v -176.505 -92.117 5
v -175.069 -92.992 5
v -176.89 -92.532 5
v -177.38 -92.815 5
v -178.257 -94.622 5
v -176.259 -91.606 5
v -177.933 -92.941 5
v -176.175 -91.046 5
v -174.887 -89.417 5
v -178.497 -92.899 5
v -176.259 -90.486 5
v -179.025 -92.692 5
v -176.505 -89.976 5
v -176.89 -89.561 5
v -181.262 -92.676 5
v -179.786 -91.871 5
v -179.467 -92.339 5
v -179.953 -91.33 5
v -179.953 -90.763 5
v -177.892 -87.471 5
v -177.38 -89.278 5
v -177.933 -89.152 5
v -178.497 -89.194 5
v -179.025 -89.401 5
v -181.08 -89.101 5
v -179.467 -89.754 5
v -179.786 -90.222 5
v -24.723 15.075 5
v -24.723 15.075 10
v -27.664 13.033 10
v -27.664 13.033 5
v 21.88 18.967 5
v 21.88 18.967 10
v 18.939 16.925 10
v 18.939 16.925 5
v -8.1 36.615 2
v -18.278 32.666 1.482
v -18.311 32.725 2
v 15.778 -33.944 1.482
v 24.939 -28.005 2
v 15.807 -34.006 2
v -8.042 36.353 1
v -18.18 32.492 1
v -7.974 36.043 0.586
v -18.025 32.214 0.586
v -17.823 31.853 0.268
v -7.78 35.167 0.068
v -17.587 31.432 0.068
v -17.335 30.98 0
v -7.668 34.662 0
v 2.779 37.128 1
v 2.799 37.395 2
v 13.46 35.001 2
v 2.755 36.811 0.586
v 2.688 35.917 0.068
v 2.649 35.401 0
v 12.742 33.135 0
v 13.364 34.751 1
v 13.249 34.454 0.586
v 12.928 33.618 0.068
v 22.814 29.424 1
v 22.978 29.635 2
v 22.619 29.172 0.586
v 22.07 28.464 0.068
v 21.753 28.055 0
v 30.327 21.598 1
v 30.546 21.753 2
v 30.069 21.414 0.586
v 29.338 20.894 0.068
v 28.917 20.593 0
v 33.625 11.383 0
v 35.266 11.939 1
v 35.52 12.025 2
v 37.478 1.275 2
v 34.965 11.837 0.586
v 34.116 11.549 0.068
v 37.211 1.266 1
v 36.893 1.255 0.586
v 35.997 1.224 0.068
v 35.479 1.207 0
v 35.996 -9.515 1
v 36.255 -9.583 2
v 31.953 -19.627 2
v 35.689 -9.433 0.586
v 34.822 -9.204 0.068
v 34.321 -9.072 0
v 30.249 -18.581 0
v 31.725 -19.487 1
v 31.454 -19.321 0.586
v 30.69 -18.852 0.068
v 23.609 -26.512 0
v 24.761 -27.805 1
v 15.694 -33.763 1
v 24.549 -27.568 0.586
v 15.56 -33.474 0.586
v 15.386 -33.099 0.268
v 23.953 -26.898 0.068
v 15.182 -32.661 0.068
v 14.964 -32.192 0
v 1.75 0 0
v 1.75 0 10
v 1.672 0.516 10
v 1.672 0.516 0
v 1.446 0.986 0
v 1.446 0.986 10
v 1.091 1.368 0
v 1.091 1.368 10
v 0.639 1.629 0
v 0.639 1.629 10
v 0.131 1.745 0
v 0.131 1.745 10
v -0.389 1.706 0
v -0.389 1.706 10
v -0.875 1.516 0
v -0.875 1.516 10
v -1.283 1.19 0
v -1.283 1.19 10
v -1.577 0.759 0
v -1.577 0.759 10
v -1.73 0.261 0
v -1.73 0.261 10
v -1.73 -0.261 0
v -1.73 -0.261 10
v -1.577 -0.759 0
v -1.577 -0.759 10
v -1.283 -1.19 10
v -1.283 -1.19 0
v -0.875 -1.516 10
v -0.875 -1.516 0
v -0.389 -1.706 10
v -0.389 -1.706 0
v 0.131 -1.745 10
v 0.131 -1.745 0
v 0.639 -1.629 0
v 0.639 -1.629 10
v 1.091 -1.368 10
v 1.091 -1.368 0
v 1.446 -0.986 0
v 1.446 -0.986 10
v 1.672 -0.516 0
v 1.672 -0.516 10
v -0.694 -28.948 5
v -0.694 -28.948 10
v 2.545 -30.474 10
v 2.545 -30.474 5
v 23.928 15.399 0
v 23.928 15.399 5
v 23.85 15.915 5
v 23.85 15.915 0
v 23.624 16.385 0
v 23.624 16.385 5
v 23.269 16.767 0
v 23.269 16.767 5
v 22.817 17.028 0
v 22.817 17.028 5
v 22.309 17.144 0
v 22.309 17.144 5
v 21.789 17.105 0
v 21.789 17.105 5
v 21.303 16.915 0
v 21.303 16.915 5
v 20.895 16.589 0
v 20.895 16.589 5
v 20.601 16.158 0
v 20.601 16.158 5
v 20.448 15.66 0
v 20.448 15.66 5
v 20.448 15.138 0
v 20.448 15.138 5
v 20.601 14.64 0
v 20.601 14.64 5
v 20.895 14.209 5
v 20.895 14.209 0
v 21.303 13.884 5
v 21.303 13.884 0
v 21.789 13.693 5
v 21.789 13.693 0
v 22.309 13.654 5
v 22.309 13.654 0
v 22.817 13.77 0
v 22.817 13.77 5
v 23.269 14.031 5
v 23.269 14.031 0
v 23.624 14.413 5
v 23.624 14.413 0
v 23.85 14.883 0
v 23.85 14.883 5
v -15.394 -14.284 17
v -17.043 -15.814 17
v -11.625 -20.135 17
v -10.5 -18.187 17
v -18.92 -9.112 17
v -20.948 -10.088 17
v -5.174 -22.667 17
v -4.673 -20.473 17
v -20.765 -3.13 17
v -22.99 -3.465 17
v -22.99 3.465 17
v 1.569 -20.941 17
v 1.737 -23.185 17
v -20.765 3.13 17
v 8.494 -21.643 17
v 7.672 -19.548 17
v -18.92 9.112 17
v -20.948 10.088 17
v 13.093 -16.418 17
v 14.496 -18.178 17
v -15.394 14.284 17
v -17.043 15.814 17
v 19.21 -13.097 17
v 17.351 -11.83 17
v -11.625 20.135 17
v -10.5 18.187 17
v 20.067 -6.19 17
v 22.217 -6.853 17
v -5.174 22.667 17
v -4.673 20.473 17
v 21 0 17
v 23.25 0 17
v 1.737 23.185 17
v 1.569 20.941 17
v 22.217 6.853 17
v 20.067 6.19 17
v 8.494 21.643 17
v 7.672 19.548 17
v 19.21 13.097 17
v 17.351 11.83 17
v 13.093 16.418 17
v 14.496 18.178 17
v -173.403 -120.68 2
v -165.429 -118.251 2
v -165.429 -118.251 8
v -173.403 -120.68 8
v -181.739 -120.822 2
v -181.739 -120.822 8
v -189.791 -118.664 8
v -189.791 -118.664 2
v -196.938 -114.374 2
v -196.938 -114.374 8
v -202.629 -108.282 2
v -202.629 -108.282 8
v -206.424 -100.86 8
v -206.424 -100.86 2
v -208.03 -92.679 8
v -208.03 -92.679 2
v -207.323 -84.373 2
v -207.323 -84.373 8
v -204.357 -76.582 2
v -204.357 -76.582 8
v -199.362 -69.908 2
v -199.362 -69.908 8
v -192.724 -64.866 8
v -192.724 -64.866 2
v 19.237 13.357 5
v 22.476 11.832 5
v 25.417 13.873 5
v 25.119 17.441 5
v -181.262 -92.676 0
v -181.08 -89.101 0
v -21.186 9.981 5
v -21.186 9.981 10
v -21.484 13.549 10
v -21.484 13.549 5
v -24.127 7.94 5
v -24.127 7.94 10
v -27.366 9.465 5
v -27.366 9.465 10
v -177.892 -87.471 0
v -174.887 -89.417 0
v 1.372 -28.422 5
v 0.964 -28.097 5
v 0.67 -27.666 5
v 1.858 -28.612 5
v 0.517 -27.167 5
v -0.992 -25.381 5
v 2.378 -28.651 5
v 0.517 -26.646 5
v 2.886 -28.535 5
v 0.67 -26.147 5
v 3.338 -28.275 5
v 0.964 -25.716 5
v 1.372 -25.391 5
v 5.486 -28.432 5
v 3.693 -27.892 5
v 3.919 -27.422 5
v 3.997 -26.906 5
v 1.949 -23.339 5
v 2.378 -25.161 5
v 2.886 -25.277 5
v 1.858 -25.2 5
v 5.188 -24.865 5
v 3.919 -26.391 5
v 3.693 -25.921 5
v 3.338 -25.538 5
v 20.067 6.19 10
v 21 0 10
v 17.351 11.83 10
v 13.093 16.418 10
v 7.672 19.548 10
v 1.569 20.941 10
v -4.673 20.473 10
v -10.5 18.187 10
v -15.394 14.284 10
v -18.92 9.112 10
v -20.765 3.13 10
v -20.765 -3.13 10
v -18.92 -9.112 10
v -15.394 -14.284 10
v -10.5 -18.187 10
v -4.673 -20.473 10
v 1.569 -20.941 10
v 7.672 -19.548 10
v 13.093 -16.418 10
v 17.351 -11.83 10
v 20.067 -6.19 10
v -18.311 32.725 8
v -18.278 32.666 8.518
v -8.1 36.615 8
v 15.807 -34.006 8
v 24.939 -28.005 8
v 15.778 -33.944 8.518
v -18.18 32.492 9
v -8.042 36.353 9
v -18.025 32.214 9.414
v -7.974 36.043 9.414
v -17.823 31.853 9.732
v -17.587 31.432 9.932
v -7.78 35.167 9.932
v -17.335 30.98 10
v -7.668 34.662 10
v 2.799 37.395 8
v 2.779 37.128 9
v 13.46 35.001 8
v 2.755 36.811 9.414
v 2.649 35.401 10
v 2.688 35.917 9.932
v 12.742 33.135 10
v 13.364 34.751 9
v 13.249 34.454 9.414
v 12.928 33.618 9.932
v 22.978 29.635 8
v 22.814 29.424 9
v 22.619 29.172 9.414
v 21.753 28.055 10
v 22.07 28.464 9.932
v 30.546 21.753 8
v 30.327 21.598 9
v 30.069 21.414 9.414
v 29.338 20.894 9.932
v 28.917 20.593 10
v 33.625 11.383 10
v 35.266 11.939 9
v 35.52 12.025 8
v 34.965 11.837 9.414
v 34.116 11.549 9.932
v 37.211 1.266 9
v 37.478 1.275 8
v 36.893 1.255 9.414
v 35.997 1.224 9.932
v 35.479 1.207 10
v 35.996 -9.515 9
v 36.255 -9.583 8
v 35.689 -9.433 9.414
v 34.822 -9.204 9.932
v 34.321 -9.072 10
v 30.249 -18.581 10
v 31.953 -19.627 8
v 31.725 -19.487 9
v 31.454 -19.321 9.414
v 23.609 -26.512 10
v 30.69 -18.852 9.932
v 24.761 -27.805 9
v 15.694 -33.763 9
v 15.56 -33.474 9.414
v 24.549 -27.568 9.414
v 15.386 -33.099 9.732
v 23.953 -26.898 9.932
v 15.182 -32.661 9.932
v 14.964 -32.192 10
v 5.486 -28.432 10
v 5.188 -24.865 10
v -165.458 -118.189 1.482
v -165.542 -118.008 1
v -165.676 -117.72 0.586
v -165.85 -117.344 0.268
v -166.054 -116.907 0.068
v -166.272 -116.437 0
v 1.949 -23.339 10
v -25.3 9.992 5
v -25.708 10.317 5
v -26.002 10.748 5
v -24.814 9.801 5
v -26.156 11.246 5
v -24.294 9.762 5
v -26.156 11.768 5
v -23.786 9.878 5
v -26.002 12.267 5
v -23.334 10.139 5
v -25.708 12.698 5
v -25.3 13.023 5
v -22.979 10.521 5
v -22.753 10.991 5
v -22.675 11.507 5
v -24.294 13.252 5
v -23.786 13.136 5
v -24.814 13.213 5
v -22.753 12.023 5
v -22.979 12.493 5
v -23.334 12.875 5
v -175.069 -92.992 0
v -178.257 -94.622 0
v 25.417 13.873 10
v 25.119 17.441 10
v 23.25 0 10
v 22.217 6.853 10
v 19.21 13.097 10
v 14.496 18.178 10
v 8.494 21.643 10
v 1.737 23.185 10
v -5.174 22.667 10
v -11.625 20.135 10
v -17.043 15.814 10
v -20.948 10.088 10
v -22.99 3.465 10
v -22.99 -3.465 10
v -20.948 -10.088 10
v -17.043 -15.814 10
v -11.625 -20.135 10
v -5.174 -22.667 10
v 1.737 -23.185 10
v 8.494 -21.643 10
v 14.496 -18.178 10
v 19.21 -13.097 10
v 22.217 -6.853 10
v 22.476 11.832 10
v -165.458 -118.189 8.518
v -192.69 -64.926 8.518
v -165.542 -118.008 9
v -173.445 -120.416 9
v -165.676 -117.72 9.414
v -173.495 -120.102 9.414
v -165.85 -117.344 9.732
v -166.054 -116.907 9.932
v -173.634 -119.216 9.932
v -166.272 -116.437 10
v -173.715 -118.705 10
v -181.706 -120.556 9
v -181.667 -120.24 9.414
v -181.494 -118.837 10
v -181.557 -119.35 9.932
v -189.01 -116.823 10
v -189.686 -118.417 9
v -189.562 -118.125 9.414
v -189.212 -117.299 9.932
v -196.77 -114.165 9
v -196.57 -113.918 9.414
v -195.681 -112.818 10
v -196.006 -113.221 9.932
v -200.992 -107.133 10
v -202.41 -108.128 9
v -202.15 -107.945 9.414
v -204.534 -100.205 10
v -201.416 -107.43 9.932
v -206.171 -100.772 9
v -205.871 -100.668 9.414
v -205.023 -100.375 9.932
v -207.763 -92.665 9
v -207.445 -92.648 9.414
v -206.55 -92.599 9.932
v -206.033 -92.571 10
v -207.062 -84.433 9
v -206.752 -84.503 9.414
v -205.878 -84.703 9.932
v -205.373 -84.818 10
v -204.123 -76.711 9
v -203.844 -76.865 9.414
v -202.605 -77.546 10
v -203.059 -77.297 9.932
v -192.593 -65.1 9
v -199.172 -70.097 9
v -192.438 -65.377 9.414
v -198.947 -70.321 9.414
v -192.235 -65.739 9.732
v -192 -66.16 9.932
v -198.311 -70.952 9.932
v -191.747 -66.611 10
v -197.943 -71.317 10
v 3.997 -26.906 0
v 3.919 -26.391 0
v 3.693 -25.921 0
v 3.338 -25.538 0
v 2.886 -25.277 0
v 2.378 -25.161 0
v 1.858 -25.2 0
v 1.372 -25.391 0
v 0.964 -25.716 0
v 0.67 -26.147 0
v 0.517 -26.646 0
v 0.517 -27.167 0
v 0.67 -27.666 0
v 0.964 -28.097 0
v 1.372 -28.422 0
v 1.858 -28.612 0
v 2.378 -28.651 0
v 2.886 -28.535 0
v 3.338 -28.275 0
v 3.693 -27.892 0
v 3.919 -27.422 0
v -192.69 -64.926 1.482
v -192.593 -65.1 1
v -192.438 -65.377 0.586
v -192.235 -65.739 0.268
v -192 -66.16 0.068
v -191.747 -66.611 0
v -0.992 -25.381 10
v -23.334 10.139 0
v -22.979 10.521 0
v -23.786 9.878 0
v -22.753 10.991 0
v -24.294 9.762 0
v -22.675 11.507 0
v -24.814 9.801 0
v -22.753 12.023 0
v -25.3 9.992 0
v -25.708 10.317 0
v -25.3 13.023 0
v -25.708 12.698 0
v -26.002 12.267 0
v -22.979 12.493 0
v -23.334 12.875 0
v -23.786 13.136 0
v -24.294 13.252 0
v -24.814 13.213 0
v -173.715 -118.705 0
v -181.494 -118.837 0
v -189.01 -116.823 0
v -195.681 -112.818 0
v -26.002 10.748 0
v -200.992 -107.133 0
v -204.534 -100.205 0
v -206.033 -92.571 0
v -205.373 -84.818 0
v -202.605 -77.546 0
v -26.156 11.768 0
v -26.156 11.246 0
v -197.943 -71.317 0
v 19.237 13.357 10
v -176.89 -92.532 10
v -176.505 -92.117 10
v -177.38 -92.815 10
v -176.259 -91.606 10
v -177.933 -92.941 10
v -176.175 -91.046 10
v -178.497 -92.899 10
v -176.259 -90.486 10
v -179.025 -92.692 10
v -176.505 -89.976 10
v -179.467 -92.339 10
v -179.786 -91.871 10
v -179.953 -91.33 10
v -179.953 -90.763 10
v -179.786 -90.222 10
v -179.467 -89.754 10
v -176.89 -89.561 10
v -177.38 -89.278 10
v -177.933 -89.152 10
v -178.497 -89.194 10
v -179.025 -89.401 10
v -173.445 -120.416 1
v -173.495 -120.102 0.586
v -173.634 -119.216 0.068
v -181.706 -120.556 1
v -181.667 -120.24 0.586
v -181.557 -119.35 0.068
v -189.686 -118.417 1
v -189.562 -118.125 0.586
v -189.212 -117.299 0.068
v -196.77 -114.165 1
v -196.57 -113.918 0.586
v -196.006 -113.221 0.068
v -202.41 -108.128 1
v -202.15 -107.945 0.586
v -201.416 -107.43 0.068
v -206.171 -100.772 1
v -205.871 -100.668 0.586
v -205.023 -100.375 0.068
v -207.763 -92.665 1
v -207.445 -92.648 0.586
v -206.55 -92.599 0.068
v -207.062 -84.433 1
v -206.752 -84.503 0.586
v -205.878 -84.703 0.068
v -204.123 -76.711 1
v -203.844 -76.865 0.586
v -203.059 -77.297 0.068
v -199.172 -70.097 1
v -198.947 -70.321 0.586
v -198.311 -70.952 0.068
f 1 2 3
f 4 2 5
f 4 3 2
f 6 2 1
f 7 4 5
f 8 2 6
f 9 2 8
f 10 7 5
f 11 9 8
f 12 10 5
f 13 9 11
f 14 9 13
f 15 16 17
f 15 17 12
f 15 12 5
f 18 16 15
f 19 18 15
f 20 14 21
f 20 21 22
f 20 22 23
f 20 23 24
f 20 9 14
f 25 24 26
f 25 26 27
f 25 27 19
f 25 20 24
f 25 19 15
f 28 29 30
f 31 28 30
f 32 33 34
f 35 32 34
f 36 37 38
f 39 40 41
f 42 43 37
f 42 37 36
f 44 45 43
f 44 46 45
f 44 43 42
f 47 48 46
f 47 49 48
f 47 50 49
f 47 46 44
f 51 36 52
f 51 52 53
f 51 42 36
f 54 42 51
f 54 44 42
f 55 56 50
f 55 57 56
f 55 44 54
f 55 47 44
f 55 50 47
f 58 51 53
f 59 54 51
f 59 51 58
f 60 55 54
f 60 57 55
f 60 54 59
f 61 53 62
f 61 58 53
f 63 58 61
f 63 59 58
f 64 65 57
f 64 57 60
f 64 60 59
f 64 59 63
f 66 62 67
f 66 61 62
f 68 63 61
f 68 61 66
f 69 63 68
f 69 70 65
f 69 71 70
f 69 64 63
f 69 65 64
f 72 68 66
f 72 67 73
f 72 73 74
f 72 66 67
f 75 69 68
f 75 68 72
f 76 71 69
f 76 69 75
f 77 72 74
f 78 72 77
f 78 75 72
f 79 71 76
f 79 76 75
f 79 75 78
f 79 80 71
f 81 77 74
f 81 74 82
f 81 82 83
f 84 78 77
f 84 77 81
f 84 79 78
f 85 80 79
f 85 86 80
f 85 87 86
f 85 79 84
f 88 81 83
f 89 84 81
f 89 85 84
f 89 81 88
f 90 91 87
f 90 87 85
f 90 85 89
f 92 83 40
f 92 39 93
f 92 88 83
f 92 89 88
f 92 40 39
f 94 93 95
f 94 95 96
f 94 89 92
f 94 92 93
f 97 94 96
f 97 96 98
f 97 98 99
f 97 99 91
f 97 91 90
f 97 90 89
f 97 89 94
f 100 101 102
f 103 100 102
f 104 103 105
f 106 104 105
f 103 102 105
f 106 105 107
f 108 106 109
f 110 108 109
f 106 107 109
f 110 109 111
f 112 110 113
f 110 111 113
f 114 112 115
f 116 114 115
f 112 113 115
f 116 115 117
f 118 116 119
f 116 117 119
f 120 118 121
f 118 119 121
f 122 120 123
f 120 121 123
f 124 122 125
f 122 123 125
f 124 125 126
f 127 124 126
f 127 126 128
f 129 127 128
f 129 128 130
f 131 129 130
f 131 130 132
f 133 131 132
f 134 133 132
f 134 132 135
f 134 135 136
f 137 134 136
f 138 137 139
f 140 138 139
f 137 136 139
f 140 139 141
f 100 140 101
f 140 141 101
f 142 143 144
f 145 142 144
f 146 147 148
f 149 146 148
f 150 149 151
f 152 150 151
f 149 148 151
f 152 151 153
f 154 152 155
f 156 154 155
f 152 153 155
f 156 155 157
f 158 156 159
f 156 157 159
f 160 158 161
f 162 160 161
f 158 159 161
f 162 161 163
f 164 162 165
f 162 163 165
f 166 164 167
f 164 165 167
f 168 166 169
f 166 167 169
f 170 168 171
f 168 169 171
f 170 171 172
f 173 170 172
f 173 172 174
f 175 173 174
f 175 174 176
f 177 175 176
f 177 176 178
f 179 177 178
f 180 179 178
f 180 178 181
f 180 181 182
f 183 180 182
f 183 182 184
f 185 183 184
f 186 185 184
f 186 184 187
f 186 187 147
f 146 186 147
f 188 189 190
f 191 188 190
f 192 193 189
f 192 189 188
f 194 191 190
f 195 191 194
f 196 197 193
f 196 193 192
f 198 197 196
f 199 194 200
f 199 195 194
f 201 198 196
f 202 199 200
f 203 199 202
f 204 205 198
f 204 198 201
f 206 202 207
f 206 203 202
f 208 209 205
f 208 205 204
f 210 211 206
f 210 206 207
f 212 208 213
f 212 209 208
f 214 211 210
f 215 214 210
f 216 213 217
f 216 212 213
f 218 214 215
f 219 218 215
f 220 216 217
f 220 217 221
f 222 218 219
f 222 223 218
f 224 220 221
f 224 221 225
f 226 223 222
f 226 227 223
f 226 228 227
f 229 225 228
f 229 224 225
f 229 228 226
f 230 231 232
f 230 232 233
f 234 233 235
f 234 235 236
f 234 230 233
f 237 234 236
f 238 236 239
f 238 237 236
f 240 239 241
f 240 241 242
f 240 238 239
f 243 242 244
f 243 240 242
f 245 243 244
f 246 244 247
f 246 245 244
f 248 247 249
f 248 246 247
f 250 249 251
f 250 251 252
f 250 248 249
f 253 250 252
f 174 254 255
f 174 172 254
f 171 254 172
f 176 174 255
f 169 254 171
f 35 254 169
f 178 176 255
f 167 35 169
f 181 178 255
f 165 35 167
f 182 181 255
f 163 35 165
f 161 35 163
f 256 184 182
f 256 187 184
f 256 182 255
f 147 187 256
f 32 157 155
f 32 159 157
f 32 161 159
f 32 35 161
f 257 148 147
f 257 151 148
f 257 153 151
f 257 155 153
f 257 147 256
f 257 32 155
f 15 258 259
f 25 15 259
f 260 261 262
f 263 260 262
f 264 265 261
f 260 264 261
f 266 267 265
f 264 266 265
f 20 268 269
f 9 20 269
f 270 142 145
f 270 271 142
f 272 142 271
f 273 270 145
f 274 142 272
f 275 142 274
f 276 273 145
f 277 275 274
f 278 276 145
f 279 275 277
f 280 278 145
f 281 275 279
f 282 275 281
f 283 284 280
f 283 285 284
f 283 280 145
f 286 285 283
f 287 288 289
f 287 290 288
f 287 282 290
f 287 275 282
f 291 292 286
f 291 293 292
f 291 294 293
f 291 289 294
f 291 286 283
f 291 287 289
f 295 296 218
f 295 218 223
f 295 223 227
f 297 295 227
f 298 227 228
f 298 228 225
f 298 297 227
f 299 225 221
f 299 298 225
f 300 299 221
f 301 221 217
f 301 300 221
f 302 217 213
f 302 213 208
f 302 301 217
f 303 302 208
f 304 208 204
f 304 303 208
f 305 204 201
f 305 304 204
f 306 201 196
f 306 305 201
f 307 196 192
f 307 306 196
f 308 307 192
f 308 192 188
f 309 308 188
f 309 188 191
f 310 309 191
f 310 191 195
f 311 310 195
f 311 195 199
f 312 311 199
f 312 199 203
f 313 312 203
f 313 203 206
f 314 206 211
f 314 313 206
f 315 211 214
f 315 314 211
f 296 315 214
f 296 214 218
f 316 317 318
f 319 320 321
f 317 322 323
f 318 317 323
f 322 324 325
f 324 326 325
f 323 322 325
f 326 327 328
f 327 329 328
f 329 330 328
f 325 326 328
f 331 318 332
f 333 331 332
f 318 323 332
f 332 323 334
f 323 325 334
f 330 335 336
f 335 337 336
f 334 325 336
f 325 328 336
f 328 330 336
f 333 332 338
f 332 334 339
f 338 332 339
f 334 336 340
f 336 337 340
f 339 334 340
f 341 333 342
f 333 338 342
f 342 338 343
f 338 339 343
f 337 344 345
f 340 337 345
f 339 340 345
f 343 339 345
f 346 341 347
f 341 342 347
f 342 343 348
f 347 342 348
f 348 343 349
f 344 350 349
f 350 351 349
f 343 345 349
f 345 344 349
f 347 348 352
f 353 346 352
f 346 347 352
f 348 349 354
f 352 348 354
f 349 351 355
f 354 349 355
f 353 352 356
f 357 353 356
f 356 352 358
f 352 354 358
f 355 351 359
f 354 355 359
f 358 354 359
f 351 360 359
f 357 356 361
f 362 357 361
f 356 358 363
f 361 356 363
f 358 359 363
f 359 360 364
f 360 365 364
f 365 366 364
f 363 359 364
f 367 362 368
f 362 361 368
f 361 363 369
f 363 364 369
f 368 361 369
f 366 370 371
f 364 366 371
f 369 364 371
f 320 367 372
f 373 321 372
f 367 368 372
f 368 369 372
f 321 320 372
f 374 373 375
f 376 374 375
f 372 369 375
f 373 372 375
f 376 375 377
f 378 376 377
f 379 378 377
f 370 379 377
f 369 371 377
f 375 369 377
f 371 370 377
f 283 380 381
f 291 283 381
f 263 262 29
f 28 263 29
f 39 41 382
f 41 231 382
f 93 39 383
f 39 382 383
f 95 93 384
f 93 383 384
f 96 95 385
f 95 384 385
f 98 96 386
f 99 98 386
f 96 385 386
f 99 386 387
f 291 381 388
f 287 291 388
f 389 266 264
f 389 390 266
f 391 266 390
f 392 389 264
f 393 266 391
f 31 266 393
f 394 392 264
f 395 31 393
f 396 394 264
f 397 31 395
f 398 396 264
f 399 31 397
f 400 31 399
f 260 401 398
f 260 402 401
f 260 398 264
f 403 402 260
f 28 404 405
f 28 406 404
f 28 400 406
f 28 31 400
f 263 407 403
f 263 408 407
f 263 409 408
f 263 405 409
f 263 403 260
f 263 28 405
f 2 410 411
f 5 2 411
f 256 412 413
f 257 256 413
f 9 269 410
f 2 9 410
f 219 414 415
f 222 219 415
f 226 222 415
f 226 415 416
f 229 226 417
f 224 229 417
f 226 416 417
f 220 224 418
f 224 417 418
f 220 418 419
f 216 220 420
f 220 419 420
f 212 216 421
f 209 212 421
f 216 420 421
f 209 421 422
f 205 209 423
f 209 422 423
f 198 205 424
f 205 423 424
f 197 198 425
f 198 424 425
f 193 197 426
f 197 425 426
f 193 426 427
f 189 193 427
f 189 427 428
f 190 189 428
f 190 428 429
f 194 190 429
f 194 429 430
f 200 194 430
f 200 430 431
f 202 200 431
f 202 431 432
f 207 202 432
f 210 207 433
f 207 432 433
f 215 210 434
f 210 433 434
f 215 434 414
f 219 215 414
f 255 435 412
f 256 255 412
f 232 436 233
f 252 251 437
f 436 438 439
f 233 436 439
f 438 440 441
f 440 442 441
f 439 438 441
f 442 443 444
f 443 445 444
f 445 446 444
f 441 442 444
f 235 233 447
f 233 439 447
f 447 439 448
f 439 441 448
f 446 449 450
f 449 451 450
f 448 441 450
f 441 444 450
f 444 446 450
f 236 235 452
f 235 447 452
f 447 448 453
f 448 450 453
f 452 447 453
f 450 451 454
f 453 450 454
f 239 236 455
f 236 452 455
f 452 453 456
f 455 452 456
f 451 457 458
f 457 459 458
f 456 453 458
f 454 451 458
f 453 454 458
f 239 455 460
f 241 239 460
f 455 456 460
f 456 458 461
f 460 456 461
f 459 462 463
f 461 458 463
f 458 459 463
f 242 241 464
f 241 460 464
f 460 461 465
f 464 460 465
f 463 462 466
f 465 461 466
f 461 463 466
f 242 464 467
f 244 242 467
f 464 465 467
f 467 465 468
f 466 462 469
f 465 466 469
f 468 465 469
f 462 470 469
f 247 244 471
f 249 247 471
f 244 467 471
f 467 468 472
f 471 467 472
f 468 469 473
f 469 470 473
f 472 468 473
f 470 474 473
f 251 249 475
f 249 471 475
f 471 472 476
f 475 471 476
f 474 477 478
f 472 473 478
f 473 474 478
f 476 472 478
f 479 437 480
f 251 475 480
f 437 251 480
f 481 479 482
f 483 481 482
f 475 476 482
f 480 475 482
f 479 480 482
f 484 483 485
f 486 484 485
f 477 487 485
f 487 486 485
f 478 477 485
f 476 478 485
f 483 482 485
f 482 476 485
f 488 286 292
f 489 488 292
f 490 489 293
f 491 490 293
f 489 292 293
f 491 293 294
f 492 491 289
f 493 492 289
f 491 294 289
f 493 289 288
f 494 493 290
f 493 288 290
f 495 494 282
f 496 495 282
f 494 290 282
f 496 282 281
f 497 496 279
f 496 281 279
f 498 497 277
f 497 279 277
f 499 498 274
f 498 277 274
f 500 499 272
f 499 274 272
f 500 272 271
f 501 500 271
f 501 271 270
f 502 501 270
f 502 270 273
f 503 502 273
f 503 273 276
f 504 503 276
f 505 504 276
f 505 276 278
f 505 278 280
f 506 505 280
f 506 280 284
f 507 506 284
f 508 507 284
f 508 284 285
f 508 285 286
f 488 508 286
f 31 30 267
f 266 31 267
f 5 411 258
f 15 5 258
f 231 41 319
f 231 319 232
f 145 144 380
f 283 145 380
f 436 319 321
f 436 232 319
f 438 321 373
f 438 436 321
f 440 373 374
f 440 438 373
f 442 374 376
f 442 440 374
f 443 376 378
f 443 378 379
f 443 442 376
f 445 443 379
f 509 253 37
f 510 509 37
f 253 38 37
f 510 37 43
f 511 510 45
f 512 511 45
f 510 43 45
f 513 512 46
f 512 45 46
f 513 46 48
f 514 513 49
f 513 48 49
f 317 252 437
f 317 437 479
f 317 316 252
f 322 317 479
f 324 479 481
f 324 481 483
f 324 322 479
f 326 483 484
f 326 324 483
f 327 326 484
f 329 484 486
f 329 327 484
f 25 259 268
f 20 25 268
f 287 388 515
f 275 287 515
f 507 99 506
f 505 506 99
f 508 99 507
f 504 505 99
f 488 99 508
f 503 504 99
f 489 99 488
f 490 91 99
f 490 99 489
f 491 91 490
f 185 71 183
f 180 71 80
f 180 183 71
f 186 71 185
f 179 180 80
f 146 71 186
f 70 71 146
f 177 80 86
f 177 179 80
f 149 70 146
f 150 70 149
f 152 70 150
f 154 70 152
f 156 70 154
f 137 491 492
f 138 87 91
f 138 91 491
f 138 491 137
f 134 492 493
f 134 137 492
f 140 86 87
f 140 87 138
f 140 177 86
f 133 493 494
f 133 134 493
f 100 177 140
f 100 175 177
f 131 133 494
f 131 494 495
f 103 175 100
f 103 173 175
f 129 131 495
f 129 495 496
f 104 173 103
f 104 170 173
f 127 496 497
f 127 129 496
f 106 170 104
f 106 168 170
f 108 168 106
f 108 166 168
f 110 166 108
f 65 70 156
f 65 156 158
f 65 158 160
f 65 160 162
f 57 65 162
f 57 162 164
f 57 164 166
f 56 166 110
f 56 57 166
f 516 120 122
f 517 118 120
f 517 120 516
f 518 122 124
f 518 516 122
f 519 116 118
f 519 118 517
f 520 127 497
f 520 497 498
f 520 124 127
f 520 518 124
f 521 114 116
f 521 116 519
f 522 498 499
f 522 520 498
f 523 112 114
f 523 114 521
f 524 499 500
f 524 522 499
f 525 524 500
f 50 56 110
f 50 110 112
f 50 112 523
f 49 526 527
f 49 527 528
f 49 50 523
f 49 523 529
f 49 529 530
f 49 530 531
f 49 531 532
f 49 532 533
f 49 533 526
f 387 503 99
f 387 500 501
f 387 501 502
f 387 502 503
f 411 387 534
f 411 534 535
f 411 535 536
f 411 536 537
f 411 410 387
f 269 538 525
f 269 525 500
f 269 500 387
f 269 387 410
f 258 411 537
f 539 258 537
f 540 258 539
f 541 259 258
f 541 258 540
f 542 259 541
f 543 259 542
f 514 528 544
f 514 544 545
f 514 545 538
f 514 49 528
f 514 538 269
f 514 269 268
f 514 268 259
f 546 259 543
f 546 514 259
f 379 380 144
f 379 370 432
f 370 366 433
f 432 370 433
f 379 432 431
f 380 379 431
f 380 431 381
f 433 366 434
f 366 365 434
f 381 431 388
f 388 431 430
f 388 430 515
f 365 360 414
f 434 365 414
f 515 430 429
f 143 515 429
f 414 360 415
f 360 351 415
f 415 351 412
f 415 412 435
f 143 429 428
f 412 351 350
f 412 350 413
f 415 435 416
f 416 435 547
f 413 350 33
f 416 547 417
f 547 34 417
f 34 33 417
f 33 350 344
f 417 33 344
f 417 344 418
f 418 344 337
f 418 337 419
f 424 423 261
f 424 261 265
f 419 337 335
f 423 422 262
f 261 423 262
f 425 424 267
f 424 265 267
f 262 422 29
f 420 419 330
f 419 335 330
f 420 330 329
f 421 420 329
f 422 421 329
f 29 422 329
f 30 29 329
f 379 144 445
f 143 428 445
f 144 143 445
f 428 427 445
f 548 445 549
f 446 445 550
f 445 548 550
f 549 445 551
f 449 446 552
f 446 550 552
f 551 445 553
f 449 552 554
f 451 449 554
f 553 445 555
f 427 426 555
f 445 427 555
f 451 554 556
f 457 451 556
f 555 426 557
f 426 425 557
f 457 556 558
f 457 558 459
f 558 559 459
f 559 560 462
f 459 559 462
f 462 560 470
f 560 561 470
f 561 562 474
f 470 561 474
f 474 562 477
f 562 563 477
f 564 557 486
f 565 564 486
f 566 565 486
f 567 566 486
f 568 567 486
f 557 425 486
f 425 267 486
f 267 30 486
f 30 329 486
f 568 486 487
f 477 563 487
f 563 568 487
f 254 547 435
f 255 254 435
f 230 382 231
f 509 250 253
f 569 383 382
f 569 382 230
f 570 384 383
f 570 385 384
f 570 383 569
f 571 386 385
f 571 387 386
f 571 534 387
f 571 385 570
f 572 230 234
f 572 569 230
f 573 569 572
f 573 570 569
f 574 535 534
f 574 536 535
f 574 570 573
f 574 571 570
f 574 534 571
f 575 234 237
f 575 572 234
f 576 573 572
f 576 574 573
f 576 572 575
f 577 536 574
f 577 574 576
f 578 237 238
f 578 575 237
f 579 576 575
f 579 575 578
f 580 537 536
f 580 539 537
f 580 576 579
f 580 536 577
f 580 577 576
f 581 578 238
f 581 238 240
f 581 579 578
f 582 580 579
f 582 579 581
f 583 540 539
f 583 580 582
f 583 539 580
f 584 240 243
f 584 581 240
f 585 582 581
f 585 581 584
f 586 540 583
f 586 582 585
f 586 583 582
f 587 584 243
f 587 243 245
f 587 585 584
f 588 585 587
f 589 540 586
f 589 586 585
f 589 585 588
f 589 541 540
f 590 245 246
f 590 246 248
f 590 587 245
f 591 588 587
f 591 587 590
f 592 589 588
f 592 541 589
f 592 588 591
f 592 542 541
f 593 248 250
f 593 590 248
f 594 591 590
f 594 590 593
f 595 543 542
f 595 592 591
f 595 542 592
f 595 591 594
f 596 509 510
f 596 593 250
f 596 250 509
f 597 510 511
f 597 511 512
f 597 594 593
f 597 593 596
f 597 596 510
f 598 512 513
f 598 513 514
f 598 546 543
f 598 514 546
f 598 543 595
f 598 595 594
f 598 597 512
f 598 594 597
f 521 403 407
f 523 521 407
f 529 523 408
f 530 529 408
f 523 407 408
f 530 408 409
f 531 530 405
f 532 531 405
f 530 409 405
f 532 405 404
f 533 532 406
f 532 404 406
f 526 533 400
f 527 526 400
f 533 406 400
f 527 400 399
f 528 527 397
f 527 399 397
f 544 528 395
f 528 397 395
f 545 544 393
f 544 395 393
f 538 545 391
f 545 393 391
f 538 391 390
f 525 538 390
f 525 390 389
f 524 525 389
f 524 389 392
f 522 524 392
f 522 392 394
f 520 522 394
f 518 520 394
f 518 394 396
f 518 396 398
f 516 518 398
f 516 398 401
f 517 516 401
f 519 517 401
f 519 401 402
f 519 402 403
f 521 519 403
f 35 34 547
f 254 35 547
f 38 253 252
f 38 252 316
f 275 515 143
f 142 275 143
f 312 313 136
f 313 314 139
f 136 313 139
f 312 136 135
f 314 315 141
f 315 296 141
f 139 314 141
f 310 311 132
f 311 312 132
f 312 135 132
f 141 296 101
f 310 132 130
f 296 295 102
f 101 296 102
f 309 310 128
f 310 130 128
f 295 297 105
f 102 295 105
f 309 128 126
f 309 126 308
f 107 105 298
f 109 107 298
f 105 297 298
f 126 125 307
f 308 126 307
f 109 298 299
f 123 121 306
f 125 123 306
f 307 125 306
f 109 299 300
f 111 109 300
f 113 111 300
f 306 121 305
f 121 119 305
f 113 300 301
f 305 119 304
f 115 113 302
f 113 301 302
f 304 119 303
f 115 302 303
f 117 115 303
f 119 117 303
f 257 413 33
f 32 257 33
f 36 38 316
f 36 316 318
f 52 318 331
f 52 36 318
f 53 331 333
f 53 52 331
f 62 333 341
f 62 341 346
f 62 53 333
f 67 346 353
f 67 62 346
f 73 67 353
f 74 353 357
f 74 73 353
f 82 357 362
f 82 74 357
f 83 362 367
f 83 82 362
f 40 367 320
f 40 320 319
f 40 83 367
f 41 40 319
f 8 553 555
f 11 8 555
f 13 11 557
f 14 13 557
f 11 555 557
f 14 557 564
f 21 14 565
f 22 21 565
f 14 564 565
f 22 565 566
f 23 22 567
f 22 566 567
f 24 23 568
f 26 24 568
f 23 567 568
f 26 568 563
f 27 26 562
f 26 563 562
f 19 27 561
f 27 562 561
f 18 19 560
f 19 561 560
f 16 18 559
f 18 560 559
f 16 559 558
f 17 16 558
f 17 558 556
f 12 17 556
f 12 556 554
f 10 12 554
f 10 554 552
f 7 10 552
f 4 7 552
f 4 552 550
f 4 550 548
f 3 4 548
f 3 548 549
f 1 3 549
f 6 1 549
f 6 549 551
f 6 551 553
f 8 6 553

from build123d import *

# Parameters (mm, degrees)
BOSS_EXTRUDE1_DEPTH = 10
FILLET1_R           = 2
SKETCH3_R           = 1.9
CUT_EXTRUDE3_DEPTH  = 240
CUT_EXTRUDE4_DEPTH  = 5
SKETCH6_R           = 1.75
CUT_EXTRUDE8_DEPTH  = 10
SKETCH7_R           = 23.25
SKETCH7_R_2         = 21
BOSS_EXTRUDE2_DEPTH = 7
CUT_EXTRUDE9_DEPTH  = 5
SKETCH9_R           = 1.75
CUT_EXTRUDE10_DEPTH = 10


with BuildPart() as part:
    # Sketch1 → Boss-Extrude1 (new body)
    with BuildSketch(Plane.XY):
        with BuildLine():
            Line((-192.723621419, -64.866060055), (-18.311266157, 32.725334708))
            ThreePointArc((-18.311266157, 32.725334708), (33.388989093, 17.071186467), (15.807091975, -34.005673693))
            Line((15.807091975, -34.005673693), (-165.428934914, -118.250866776))
            ThreePointArc((-165.428934914, -118.250866776), (-204.785799768, -104.703276995), (-192.723621419, -64.866060055))
        make_face()
    extrude(amount=BOSS_EXTRUDE1_DEPTH)

    # Fillet1
    fillet1_edges = [part.edges().sort_by_distance(p)[0] for p in [
        (33.388989093, 17.071186467, 10),
        (-105.517443788, -16.070362674, 10),
        (-204.785799768, -104.703276995, 10),
        (-105.517443788, -16.070362674, 0),
        (33.388989093, 17.071186467, 0),
        (-74.81092147, -76.128270234, 0),
        (-204.785799768, -104.703276995, 0),
        (-74.81092147, -76.128270234, 10),
    ]]
    fillet(fillet1_edges, radius=FILLET1_R)

    # Sketch3 → Cut-Extrude3 (cut)
    with BuildSketch(Plane.XY.offset(10)):
        with Locations((-178.074608494, -91.046327822)):
            Circle(SKETCH3_R)
    extrude(amount=-CUT_EXTRUDE3_DEPTH, mode=Mode.SUBTRACT)

    # Sketch4 → Cut-Extrude4 (cut)
    with BuildSketch(Plane.XY.offset(10)):
        Polygon((1.949051074, -23.338757463), (-0.99159812, -25.380566053), (-0.693664608, -28.948147254), (2.544918098, -30.473919864), (5.485567292, -28.432111274), (5.18763378, -24.864530073), align=None)
        Polygon((19.237431318, 13.357306475), (22.476014024, 11.831533865), (25.416663218, 13.873342455), (25.118729706, 17.440923655), (21.880147001, 18.966696266), (18.939497807, 16.924887676), align=None)
        Polygon((-21.186482393, 9.981450988), (-21.484415905, 13.549032188), (-24.72299861, 15.074804799), (-27.663647804, 13.032996209), (-27.365714292, 9.465415008), (-24.127131587, 7.939642398), align=None)
    extrude(amount=-CUT_EXTRUDE4_DEPTH, mode=Mode.SUBTRACT)

    # Sketch6 → Cut-Extrude8 (cut)
    with BuildSketch(Plane.XY.offset(10)):
        with Locations((2.246984586, -26.906338663)):
            Circle(SKETCH6_R)
        with Locations((-24.425065098, 11.507223598)):
            Circle(SKETCH6_R)
        with Locations((22.178080512, 15.399115065)):
            Circle(SKETCH6_R)
    extrude(amount=-CUT_EXTRUDE8_DEPTH, mode=Mode.SUBTRACT)

    # Sketch7 → Boss-Extrude2 (add)
    with BuildSketch(Plane.XY.offset(10)):
        Circle(SKETCH7_R)
        Circle(SKETCH7_R_2, mode=Mode.SUBTRACT)
    extrude(amount=BOSS_EXTRUDE2_DEPTH)

    # Sketch8 → Cut-Extrude9 (cut)
    with BuildSketch(Plane(origin=(0, 0, 0), x_dir=(-1, 0, 0), z_dir=(0, 0, -1))):
        Polygon((181.262166534, -92.676012988), (181.079736268, -89.100664166), (177.892178228, -87.470979), (174.887050454, -89.416642655), (175.06948072, -92.991991477), (178.25703876, -94.621676643), align=None)
    extrude(amount=-CUT_EXTRUDE9_DEPTH, mode=Mode.SUBTRACT)

    # Sketch9 → Cut-Extrude10 (cut)
    with BuildSketch(Plane.XY.offset(10)):
        Circle(SKETCH9_R)
    extrude(amount=-CUT_EXTRUDE10_DEPTH, mode=Mode.SUBTRACT)


solid = part.part
